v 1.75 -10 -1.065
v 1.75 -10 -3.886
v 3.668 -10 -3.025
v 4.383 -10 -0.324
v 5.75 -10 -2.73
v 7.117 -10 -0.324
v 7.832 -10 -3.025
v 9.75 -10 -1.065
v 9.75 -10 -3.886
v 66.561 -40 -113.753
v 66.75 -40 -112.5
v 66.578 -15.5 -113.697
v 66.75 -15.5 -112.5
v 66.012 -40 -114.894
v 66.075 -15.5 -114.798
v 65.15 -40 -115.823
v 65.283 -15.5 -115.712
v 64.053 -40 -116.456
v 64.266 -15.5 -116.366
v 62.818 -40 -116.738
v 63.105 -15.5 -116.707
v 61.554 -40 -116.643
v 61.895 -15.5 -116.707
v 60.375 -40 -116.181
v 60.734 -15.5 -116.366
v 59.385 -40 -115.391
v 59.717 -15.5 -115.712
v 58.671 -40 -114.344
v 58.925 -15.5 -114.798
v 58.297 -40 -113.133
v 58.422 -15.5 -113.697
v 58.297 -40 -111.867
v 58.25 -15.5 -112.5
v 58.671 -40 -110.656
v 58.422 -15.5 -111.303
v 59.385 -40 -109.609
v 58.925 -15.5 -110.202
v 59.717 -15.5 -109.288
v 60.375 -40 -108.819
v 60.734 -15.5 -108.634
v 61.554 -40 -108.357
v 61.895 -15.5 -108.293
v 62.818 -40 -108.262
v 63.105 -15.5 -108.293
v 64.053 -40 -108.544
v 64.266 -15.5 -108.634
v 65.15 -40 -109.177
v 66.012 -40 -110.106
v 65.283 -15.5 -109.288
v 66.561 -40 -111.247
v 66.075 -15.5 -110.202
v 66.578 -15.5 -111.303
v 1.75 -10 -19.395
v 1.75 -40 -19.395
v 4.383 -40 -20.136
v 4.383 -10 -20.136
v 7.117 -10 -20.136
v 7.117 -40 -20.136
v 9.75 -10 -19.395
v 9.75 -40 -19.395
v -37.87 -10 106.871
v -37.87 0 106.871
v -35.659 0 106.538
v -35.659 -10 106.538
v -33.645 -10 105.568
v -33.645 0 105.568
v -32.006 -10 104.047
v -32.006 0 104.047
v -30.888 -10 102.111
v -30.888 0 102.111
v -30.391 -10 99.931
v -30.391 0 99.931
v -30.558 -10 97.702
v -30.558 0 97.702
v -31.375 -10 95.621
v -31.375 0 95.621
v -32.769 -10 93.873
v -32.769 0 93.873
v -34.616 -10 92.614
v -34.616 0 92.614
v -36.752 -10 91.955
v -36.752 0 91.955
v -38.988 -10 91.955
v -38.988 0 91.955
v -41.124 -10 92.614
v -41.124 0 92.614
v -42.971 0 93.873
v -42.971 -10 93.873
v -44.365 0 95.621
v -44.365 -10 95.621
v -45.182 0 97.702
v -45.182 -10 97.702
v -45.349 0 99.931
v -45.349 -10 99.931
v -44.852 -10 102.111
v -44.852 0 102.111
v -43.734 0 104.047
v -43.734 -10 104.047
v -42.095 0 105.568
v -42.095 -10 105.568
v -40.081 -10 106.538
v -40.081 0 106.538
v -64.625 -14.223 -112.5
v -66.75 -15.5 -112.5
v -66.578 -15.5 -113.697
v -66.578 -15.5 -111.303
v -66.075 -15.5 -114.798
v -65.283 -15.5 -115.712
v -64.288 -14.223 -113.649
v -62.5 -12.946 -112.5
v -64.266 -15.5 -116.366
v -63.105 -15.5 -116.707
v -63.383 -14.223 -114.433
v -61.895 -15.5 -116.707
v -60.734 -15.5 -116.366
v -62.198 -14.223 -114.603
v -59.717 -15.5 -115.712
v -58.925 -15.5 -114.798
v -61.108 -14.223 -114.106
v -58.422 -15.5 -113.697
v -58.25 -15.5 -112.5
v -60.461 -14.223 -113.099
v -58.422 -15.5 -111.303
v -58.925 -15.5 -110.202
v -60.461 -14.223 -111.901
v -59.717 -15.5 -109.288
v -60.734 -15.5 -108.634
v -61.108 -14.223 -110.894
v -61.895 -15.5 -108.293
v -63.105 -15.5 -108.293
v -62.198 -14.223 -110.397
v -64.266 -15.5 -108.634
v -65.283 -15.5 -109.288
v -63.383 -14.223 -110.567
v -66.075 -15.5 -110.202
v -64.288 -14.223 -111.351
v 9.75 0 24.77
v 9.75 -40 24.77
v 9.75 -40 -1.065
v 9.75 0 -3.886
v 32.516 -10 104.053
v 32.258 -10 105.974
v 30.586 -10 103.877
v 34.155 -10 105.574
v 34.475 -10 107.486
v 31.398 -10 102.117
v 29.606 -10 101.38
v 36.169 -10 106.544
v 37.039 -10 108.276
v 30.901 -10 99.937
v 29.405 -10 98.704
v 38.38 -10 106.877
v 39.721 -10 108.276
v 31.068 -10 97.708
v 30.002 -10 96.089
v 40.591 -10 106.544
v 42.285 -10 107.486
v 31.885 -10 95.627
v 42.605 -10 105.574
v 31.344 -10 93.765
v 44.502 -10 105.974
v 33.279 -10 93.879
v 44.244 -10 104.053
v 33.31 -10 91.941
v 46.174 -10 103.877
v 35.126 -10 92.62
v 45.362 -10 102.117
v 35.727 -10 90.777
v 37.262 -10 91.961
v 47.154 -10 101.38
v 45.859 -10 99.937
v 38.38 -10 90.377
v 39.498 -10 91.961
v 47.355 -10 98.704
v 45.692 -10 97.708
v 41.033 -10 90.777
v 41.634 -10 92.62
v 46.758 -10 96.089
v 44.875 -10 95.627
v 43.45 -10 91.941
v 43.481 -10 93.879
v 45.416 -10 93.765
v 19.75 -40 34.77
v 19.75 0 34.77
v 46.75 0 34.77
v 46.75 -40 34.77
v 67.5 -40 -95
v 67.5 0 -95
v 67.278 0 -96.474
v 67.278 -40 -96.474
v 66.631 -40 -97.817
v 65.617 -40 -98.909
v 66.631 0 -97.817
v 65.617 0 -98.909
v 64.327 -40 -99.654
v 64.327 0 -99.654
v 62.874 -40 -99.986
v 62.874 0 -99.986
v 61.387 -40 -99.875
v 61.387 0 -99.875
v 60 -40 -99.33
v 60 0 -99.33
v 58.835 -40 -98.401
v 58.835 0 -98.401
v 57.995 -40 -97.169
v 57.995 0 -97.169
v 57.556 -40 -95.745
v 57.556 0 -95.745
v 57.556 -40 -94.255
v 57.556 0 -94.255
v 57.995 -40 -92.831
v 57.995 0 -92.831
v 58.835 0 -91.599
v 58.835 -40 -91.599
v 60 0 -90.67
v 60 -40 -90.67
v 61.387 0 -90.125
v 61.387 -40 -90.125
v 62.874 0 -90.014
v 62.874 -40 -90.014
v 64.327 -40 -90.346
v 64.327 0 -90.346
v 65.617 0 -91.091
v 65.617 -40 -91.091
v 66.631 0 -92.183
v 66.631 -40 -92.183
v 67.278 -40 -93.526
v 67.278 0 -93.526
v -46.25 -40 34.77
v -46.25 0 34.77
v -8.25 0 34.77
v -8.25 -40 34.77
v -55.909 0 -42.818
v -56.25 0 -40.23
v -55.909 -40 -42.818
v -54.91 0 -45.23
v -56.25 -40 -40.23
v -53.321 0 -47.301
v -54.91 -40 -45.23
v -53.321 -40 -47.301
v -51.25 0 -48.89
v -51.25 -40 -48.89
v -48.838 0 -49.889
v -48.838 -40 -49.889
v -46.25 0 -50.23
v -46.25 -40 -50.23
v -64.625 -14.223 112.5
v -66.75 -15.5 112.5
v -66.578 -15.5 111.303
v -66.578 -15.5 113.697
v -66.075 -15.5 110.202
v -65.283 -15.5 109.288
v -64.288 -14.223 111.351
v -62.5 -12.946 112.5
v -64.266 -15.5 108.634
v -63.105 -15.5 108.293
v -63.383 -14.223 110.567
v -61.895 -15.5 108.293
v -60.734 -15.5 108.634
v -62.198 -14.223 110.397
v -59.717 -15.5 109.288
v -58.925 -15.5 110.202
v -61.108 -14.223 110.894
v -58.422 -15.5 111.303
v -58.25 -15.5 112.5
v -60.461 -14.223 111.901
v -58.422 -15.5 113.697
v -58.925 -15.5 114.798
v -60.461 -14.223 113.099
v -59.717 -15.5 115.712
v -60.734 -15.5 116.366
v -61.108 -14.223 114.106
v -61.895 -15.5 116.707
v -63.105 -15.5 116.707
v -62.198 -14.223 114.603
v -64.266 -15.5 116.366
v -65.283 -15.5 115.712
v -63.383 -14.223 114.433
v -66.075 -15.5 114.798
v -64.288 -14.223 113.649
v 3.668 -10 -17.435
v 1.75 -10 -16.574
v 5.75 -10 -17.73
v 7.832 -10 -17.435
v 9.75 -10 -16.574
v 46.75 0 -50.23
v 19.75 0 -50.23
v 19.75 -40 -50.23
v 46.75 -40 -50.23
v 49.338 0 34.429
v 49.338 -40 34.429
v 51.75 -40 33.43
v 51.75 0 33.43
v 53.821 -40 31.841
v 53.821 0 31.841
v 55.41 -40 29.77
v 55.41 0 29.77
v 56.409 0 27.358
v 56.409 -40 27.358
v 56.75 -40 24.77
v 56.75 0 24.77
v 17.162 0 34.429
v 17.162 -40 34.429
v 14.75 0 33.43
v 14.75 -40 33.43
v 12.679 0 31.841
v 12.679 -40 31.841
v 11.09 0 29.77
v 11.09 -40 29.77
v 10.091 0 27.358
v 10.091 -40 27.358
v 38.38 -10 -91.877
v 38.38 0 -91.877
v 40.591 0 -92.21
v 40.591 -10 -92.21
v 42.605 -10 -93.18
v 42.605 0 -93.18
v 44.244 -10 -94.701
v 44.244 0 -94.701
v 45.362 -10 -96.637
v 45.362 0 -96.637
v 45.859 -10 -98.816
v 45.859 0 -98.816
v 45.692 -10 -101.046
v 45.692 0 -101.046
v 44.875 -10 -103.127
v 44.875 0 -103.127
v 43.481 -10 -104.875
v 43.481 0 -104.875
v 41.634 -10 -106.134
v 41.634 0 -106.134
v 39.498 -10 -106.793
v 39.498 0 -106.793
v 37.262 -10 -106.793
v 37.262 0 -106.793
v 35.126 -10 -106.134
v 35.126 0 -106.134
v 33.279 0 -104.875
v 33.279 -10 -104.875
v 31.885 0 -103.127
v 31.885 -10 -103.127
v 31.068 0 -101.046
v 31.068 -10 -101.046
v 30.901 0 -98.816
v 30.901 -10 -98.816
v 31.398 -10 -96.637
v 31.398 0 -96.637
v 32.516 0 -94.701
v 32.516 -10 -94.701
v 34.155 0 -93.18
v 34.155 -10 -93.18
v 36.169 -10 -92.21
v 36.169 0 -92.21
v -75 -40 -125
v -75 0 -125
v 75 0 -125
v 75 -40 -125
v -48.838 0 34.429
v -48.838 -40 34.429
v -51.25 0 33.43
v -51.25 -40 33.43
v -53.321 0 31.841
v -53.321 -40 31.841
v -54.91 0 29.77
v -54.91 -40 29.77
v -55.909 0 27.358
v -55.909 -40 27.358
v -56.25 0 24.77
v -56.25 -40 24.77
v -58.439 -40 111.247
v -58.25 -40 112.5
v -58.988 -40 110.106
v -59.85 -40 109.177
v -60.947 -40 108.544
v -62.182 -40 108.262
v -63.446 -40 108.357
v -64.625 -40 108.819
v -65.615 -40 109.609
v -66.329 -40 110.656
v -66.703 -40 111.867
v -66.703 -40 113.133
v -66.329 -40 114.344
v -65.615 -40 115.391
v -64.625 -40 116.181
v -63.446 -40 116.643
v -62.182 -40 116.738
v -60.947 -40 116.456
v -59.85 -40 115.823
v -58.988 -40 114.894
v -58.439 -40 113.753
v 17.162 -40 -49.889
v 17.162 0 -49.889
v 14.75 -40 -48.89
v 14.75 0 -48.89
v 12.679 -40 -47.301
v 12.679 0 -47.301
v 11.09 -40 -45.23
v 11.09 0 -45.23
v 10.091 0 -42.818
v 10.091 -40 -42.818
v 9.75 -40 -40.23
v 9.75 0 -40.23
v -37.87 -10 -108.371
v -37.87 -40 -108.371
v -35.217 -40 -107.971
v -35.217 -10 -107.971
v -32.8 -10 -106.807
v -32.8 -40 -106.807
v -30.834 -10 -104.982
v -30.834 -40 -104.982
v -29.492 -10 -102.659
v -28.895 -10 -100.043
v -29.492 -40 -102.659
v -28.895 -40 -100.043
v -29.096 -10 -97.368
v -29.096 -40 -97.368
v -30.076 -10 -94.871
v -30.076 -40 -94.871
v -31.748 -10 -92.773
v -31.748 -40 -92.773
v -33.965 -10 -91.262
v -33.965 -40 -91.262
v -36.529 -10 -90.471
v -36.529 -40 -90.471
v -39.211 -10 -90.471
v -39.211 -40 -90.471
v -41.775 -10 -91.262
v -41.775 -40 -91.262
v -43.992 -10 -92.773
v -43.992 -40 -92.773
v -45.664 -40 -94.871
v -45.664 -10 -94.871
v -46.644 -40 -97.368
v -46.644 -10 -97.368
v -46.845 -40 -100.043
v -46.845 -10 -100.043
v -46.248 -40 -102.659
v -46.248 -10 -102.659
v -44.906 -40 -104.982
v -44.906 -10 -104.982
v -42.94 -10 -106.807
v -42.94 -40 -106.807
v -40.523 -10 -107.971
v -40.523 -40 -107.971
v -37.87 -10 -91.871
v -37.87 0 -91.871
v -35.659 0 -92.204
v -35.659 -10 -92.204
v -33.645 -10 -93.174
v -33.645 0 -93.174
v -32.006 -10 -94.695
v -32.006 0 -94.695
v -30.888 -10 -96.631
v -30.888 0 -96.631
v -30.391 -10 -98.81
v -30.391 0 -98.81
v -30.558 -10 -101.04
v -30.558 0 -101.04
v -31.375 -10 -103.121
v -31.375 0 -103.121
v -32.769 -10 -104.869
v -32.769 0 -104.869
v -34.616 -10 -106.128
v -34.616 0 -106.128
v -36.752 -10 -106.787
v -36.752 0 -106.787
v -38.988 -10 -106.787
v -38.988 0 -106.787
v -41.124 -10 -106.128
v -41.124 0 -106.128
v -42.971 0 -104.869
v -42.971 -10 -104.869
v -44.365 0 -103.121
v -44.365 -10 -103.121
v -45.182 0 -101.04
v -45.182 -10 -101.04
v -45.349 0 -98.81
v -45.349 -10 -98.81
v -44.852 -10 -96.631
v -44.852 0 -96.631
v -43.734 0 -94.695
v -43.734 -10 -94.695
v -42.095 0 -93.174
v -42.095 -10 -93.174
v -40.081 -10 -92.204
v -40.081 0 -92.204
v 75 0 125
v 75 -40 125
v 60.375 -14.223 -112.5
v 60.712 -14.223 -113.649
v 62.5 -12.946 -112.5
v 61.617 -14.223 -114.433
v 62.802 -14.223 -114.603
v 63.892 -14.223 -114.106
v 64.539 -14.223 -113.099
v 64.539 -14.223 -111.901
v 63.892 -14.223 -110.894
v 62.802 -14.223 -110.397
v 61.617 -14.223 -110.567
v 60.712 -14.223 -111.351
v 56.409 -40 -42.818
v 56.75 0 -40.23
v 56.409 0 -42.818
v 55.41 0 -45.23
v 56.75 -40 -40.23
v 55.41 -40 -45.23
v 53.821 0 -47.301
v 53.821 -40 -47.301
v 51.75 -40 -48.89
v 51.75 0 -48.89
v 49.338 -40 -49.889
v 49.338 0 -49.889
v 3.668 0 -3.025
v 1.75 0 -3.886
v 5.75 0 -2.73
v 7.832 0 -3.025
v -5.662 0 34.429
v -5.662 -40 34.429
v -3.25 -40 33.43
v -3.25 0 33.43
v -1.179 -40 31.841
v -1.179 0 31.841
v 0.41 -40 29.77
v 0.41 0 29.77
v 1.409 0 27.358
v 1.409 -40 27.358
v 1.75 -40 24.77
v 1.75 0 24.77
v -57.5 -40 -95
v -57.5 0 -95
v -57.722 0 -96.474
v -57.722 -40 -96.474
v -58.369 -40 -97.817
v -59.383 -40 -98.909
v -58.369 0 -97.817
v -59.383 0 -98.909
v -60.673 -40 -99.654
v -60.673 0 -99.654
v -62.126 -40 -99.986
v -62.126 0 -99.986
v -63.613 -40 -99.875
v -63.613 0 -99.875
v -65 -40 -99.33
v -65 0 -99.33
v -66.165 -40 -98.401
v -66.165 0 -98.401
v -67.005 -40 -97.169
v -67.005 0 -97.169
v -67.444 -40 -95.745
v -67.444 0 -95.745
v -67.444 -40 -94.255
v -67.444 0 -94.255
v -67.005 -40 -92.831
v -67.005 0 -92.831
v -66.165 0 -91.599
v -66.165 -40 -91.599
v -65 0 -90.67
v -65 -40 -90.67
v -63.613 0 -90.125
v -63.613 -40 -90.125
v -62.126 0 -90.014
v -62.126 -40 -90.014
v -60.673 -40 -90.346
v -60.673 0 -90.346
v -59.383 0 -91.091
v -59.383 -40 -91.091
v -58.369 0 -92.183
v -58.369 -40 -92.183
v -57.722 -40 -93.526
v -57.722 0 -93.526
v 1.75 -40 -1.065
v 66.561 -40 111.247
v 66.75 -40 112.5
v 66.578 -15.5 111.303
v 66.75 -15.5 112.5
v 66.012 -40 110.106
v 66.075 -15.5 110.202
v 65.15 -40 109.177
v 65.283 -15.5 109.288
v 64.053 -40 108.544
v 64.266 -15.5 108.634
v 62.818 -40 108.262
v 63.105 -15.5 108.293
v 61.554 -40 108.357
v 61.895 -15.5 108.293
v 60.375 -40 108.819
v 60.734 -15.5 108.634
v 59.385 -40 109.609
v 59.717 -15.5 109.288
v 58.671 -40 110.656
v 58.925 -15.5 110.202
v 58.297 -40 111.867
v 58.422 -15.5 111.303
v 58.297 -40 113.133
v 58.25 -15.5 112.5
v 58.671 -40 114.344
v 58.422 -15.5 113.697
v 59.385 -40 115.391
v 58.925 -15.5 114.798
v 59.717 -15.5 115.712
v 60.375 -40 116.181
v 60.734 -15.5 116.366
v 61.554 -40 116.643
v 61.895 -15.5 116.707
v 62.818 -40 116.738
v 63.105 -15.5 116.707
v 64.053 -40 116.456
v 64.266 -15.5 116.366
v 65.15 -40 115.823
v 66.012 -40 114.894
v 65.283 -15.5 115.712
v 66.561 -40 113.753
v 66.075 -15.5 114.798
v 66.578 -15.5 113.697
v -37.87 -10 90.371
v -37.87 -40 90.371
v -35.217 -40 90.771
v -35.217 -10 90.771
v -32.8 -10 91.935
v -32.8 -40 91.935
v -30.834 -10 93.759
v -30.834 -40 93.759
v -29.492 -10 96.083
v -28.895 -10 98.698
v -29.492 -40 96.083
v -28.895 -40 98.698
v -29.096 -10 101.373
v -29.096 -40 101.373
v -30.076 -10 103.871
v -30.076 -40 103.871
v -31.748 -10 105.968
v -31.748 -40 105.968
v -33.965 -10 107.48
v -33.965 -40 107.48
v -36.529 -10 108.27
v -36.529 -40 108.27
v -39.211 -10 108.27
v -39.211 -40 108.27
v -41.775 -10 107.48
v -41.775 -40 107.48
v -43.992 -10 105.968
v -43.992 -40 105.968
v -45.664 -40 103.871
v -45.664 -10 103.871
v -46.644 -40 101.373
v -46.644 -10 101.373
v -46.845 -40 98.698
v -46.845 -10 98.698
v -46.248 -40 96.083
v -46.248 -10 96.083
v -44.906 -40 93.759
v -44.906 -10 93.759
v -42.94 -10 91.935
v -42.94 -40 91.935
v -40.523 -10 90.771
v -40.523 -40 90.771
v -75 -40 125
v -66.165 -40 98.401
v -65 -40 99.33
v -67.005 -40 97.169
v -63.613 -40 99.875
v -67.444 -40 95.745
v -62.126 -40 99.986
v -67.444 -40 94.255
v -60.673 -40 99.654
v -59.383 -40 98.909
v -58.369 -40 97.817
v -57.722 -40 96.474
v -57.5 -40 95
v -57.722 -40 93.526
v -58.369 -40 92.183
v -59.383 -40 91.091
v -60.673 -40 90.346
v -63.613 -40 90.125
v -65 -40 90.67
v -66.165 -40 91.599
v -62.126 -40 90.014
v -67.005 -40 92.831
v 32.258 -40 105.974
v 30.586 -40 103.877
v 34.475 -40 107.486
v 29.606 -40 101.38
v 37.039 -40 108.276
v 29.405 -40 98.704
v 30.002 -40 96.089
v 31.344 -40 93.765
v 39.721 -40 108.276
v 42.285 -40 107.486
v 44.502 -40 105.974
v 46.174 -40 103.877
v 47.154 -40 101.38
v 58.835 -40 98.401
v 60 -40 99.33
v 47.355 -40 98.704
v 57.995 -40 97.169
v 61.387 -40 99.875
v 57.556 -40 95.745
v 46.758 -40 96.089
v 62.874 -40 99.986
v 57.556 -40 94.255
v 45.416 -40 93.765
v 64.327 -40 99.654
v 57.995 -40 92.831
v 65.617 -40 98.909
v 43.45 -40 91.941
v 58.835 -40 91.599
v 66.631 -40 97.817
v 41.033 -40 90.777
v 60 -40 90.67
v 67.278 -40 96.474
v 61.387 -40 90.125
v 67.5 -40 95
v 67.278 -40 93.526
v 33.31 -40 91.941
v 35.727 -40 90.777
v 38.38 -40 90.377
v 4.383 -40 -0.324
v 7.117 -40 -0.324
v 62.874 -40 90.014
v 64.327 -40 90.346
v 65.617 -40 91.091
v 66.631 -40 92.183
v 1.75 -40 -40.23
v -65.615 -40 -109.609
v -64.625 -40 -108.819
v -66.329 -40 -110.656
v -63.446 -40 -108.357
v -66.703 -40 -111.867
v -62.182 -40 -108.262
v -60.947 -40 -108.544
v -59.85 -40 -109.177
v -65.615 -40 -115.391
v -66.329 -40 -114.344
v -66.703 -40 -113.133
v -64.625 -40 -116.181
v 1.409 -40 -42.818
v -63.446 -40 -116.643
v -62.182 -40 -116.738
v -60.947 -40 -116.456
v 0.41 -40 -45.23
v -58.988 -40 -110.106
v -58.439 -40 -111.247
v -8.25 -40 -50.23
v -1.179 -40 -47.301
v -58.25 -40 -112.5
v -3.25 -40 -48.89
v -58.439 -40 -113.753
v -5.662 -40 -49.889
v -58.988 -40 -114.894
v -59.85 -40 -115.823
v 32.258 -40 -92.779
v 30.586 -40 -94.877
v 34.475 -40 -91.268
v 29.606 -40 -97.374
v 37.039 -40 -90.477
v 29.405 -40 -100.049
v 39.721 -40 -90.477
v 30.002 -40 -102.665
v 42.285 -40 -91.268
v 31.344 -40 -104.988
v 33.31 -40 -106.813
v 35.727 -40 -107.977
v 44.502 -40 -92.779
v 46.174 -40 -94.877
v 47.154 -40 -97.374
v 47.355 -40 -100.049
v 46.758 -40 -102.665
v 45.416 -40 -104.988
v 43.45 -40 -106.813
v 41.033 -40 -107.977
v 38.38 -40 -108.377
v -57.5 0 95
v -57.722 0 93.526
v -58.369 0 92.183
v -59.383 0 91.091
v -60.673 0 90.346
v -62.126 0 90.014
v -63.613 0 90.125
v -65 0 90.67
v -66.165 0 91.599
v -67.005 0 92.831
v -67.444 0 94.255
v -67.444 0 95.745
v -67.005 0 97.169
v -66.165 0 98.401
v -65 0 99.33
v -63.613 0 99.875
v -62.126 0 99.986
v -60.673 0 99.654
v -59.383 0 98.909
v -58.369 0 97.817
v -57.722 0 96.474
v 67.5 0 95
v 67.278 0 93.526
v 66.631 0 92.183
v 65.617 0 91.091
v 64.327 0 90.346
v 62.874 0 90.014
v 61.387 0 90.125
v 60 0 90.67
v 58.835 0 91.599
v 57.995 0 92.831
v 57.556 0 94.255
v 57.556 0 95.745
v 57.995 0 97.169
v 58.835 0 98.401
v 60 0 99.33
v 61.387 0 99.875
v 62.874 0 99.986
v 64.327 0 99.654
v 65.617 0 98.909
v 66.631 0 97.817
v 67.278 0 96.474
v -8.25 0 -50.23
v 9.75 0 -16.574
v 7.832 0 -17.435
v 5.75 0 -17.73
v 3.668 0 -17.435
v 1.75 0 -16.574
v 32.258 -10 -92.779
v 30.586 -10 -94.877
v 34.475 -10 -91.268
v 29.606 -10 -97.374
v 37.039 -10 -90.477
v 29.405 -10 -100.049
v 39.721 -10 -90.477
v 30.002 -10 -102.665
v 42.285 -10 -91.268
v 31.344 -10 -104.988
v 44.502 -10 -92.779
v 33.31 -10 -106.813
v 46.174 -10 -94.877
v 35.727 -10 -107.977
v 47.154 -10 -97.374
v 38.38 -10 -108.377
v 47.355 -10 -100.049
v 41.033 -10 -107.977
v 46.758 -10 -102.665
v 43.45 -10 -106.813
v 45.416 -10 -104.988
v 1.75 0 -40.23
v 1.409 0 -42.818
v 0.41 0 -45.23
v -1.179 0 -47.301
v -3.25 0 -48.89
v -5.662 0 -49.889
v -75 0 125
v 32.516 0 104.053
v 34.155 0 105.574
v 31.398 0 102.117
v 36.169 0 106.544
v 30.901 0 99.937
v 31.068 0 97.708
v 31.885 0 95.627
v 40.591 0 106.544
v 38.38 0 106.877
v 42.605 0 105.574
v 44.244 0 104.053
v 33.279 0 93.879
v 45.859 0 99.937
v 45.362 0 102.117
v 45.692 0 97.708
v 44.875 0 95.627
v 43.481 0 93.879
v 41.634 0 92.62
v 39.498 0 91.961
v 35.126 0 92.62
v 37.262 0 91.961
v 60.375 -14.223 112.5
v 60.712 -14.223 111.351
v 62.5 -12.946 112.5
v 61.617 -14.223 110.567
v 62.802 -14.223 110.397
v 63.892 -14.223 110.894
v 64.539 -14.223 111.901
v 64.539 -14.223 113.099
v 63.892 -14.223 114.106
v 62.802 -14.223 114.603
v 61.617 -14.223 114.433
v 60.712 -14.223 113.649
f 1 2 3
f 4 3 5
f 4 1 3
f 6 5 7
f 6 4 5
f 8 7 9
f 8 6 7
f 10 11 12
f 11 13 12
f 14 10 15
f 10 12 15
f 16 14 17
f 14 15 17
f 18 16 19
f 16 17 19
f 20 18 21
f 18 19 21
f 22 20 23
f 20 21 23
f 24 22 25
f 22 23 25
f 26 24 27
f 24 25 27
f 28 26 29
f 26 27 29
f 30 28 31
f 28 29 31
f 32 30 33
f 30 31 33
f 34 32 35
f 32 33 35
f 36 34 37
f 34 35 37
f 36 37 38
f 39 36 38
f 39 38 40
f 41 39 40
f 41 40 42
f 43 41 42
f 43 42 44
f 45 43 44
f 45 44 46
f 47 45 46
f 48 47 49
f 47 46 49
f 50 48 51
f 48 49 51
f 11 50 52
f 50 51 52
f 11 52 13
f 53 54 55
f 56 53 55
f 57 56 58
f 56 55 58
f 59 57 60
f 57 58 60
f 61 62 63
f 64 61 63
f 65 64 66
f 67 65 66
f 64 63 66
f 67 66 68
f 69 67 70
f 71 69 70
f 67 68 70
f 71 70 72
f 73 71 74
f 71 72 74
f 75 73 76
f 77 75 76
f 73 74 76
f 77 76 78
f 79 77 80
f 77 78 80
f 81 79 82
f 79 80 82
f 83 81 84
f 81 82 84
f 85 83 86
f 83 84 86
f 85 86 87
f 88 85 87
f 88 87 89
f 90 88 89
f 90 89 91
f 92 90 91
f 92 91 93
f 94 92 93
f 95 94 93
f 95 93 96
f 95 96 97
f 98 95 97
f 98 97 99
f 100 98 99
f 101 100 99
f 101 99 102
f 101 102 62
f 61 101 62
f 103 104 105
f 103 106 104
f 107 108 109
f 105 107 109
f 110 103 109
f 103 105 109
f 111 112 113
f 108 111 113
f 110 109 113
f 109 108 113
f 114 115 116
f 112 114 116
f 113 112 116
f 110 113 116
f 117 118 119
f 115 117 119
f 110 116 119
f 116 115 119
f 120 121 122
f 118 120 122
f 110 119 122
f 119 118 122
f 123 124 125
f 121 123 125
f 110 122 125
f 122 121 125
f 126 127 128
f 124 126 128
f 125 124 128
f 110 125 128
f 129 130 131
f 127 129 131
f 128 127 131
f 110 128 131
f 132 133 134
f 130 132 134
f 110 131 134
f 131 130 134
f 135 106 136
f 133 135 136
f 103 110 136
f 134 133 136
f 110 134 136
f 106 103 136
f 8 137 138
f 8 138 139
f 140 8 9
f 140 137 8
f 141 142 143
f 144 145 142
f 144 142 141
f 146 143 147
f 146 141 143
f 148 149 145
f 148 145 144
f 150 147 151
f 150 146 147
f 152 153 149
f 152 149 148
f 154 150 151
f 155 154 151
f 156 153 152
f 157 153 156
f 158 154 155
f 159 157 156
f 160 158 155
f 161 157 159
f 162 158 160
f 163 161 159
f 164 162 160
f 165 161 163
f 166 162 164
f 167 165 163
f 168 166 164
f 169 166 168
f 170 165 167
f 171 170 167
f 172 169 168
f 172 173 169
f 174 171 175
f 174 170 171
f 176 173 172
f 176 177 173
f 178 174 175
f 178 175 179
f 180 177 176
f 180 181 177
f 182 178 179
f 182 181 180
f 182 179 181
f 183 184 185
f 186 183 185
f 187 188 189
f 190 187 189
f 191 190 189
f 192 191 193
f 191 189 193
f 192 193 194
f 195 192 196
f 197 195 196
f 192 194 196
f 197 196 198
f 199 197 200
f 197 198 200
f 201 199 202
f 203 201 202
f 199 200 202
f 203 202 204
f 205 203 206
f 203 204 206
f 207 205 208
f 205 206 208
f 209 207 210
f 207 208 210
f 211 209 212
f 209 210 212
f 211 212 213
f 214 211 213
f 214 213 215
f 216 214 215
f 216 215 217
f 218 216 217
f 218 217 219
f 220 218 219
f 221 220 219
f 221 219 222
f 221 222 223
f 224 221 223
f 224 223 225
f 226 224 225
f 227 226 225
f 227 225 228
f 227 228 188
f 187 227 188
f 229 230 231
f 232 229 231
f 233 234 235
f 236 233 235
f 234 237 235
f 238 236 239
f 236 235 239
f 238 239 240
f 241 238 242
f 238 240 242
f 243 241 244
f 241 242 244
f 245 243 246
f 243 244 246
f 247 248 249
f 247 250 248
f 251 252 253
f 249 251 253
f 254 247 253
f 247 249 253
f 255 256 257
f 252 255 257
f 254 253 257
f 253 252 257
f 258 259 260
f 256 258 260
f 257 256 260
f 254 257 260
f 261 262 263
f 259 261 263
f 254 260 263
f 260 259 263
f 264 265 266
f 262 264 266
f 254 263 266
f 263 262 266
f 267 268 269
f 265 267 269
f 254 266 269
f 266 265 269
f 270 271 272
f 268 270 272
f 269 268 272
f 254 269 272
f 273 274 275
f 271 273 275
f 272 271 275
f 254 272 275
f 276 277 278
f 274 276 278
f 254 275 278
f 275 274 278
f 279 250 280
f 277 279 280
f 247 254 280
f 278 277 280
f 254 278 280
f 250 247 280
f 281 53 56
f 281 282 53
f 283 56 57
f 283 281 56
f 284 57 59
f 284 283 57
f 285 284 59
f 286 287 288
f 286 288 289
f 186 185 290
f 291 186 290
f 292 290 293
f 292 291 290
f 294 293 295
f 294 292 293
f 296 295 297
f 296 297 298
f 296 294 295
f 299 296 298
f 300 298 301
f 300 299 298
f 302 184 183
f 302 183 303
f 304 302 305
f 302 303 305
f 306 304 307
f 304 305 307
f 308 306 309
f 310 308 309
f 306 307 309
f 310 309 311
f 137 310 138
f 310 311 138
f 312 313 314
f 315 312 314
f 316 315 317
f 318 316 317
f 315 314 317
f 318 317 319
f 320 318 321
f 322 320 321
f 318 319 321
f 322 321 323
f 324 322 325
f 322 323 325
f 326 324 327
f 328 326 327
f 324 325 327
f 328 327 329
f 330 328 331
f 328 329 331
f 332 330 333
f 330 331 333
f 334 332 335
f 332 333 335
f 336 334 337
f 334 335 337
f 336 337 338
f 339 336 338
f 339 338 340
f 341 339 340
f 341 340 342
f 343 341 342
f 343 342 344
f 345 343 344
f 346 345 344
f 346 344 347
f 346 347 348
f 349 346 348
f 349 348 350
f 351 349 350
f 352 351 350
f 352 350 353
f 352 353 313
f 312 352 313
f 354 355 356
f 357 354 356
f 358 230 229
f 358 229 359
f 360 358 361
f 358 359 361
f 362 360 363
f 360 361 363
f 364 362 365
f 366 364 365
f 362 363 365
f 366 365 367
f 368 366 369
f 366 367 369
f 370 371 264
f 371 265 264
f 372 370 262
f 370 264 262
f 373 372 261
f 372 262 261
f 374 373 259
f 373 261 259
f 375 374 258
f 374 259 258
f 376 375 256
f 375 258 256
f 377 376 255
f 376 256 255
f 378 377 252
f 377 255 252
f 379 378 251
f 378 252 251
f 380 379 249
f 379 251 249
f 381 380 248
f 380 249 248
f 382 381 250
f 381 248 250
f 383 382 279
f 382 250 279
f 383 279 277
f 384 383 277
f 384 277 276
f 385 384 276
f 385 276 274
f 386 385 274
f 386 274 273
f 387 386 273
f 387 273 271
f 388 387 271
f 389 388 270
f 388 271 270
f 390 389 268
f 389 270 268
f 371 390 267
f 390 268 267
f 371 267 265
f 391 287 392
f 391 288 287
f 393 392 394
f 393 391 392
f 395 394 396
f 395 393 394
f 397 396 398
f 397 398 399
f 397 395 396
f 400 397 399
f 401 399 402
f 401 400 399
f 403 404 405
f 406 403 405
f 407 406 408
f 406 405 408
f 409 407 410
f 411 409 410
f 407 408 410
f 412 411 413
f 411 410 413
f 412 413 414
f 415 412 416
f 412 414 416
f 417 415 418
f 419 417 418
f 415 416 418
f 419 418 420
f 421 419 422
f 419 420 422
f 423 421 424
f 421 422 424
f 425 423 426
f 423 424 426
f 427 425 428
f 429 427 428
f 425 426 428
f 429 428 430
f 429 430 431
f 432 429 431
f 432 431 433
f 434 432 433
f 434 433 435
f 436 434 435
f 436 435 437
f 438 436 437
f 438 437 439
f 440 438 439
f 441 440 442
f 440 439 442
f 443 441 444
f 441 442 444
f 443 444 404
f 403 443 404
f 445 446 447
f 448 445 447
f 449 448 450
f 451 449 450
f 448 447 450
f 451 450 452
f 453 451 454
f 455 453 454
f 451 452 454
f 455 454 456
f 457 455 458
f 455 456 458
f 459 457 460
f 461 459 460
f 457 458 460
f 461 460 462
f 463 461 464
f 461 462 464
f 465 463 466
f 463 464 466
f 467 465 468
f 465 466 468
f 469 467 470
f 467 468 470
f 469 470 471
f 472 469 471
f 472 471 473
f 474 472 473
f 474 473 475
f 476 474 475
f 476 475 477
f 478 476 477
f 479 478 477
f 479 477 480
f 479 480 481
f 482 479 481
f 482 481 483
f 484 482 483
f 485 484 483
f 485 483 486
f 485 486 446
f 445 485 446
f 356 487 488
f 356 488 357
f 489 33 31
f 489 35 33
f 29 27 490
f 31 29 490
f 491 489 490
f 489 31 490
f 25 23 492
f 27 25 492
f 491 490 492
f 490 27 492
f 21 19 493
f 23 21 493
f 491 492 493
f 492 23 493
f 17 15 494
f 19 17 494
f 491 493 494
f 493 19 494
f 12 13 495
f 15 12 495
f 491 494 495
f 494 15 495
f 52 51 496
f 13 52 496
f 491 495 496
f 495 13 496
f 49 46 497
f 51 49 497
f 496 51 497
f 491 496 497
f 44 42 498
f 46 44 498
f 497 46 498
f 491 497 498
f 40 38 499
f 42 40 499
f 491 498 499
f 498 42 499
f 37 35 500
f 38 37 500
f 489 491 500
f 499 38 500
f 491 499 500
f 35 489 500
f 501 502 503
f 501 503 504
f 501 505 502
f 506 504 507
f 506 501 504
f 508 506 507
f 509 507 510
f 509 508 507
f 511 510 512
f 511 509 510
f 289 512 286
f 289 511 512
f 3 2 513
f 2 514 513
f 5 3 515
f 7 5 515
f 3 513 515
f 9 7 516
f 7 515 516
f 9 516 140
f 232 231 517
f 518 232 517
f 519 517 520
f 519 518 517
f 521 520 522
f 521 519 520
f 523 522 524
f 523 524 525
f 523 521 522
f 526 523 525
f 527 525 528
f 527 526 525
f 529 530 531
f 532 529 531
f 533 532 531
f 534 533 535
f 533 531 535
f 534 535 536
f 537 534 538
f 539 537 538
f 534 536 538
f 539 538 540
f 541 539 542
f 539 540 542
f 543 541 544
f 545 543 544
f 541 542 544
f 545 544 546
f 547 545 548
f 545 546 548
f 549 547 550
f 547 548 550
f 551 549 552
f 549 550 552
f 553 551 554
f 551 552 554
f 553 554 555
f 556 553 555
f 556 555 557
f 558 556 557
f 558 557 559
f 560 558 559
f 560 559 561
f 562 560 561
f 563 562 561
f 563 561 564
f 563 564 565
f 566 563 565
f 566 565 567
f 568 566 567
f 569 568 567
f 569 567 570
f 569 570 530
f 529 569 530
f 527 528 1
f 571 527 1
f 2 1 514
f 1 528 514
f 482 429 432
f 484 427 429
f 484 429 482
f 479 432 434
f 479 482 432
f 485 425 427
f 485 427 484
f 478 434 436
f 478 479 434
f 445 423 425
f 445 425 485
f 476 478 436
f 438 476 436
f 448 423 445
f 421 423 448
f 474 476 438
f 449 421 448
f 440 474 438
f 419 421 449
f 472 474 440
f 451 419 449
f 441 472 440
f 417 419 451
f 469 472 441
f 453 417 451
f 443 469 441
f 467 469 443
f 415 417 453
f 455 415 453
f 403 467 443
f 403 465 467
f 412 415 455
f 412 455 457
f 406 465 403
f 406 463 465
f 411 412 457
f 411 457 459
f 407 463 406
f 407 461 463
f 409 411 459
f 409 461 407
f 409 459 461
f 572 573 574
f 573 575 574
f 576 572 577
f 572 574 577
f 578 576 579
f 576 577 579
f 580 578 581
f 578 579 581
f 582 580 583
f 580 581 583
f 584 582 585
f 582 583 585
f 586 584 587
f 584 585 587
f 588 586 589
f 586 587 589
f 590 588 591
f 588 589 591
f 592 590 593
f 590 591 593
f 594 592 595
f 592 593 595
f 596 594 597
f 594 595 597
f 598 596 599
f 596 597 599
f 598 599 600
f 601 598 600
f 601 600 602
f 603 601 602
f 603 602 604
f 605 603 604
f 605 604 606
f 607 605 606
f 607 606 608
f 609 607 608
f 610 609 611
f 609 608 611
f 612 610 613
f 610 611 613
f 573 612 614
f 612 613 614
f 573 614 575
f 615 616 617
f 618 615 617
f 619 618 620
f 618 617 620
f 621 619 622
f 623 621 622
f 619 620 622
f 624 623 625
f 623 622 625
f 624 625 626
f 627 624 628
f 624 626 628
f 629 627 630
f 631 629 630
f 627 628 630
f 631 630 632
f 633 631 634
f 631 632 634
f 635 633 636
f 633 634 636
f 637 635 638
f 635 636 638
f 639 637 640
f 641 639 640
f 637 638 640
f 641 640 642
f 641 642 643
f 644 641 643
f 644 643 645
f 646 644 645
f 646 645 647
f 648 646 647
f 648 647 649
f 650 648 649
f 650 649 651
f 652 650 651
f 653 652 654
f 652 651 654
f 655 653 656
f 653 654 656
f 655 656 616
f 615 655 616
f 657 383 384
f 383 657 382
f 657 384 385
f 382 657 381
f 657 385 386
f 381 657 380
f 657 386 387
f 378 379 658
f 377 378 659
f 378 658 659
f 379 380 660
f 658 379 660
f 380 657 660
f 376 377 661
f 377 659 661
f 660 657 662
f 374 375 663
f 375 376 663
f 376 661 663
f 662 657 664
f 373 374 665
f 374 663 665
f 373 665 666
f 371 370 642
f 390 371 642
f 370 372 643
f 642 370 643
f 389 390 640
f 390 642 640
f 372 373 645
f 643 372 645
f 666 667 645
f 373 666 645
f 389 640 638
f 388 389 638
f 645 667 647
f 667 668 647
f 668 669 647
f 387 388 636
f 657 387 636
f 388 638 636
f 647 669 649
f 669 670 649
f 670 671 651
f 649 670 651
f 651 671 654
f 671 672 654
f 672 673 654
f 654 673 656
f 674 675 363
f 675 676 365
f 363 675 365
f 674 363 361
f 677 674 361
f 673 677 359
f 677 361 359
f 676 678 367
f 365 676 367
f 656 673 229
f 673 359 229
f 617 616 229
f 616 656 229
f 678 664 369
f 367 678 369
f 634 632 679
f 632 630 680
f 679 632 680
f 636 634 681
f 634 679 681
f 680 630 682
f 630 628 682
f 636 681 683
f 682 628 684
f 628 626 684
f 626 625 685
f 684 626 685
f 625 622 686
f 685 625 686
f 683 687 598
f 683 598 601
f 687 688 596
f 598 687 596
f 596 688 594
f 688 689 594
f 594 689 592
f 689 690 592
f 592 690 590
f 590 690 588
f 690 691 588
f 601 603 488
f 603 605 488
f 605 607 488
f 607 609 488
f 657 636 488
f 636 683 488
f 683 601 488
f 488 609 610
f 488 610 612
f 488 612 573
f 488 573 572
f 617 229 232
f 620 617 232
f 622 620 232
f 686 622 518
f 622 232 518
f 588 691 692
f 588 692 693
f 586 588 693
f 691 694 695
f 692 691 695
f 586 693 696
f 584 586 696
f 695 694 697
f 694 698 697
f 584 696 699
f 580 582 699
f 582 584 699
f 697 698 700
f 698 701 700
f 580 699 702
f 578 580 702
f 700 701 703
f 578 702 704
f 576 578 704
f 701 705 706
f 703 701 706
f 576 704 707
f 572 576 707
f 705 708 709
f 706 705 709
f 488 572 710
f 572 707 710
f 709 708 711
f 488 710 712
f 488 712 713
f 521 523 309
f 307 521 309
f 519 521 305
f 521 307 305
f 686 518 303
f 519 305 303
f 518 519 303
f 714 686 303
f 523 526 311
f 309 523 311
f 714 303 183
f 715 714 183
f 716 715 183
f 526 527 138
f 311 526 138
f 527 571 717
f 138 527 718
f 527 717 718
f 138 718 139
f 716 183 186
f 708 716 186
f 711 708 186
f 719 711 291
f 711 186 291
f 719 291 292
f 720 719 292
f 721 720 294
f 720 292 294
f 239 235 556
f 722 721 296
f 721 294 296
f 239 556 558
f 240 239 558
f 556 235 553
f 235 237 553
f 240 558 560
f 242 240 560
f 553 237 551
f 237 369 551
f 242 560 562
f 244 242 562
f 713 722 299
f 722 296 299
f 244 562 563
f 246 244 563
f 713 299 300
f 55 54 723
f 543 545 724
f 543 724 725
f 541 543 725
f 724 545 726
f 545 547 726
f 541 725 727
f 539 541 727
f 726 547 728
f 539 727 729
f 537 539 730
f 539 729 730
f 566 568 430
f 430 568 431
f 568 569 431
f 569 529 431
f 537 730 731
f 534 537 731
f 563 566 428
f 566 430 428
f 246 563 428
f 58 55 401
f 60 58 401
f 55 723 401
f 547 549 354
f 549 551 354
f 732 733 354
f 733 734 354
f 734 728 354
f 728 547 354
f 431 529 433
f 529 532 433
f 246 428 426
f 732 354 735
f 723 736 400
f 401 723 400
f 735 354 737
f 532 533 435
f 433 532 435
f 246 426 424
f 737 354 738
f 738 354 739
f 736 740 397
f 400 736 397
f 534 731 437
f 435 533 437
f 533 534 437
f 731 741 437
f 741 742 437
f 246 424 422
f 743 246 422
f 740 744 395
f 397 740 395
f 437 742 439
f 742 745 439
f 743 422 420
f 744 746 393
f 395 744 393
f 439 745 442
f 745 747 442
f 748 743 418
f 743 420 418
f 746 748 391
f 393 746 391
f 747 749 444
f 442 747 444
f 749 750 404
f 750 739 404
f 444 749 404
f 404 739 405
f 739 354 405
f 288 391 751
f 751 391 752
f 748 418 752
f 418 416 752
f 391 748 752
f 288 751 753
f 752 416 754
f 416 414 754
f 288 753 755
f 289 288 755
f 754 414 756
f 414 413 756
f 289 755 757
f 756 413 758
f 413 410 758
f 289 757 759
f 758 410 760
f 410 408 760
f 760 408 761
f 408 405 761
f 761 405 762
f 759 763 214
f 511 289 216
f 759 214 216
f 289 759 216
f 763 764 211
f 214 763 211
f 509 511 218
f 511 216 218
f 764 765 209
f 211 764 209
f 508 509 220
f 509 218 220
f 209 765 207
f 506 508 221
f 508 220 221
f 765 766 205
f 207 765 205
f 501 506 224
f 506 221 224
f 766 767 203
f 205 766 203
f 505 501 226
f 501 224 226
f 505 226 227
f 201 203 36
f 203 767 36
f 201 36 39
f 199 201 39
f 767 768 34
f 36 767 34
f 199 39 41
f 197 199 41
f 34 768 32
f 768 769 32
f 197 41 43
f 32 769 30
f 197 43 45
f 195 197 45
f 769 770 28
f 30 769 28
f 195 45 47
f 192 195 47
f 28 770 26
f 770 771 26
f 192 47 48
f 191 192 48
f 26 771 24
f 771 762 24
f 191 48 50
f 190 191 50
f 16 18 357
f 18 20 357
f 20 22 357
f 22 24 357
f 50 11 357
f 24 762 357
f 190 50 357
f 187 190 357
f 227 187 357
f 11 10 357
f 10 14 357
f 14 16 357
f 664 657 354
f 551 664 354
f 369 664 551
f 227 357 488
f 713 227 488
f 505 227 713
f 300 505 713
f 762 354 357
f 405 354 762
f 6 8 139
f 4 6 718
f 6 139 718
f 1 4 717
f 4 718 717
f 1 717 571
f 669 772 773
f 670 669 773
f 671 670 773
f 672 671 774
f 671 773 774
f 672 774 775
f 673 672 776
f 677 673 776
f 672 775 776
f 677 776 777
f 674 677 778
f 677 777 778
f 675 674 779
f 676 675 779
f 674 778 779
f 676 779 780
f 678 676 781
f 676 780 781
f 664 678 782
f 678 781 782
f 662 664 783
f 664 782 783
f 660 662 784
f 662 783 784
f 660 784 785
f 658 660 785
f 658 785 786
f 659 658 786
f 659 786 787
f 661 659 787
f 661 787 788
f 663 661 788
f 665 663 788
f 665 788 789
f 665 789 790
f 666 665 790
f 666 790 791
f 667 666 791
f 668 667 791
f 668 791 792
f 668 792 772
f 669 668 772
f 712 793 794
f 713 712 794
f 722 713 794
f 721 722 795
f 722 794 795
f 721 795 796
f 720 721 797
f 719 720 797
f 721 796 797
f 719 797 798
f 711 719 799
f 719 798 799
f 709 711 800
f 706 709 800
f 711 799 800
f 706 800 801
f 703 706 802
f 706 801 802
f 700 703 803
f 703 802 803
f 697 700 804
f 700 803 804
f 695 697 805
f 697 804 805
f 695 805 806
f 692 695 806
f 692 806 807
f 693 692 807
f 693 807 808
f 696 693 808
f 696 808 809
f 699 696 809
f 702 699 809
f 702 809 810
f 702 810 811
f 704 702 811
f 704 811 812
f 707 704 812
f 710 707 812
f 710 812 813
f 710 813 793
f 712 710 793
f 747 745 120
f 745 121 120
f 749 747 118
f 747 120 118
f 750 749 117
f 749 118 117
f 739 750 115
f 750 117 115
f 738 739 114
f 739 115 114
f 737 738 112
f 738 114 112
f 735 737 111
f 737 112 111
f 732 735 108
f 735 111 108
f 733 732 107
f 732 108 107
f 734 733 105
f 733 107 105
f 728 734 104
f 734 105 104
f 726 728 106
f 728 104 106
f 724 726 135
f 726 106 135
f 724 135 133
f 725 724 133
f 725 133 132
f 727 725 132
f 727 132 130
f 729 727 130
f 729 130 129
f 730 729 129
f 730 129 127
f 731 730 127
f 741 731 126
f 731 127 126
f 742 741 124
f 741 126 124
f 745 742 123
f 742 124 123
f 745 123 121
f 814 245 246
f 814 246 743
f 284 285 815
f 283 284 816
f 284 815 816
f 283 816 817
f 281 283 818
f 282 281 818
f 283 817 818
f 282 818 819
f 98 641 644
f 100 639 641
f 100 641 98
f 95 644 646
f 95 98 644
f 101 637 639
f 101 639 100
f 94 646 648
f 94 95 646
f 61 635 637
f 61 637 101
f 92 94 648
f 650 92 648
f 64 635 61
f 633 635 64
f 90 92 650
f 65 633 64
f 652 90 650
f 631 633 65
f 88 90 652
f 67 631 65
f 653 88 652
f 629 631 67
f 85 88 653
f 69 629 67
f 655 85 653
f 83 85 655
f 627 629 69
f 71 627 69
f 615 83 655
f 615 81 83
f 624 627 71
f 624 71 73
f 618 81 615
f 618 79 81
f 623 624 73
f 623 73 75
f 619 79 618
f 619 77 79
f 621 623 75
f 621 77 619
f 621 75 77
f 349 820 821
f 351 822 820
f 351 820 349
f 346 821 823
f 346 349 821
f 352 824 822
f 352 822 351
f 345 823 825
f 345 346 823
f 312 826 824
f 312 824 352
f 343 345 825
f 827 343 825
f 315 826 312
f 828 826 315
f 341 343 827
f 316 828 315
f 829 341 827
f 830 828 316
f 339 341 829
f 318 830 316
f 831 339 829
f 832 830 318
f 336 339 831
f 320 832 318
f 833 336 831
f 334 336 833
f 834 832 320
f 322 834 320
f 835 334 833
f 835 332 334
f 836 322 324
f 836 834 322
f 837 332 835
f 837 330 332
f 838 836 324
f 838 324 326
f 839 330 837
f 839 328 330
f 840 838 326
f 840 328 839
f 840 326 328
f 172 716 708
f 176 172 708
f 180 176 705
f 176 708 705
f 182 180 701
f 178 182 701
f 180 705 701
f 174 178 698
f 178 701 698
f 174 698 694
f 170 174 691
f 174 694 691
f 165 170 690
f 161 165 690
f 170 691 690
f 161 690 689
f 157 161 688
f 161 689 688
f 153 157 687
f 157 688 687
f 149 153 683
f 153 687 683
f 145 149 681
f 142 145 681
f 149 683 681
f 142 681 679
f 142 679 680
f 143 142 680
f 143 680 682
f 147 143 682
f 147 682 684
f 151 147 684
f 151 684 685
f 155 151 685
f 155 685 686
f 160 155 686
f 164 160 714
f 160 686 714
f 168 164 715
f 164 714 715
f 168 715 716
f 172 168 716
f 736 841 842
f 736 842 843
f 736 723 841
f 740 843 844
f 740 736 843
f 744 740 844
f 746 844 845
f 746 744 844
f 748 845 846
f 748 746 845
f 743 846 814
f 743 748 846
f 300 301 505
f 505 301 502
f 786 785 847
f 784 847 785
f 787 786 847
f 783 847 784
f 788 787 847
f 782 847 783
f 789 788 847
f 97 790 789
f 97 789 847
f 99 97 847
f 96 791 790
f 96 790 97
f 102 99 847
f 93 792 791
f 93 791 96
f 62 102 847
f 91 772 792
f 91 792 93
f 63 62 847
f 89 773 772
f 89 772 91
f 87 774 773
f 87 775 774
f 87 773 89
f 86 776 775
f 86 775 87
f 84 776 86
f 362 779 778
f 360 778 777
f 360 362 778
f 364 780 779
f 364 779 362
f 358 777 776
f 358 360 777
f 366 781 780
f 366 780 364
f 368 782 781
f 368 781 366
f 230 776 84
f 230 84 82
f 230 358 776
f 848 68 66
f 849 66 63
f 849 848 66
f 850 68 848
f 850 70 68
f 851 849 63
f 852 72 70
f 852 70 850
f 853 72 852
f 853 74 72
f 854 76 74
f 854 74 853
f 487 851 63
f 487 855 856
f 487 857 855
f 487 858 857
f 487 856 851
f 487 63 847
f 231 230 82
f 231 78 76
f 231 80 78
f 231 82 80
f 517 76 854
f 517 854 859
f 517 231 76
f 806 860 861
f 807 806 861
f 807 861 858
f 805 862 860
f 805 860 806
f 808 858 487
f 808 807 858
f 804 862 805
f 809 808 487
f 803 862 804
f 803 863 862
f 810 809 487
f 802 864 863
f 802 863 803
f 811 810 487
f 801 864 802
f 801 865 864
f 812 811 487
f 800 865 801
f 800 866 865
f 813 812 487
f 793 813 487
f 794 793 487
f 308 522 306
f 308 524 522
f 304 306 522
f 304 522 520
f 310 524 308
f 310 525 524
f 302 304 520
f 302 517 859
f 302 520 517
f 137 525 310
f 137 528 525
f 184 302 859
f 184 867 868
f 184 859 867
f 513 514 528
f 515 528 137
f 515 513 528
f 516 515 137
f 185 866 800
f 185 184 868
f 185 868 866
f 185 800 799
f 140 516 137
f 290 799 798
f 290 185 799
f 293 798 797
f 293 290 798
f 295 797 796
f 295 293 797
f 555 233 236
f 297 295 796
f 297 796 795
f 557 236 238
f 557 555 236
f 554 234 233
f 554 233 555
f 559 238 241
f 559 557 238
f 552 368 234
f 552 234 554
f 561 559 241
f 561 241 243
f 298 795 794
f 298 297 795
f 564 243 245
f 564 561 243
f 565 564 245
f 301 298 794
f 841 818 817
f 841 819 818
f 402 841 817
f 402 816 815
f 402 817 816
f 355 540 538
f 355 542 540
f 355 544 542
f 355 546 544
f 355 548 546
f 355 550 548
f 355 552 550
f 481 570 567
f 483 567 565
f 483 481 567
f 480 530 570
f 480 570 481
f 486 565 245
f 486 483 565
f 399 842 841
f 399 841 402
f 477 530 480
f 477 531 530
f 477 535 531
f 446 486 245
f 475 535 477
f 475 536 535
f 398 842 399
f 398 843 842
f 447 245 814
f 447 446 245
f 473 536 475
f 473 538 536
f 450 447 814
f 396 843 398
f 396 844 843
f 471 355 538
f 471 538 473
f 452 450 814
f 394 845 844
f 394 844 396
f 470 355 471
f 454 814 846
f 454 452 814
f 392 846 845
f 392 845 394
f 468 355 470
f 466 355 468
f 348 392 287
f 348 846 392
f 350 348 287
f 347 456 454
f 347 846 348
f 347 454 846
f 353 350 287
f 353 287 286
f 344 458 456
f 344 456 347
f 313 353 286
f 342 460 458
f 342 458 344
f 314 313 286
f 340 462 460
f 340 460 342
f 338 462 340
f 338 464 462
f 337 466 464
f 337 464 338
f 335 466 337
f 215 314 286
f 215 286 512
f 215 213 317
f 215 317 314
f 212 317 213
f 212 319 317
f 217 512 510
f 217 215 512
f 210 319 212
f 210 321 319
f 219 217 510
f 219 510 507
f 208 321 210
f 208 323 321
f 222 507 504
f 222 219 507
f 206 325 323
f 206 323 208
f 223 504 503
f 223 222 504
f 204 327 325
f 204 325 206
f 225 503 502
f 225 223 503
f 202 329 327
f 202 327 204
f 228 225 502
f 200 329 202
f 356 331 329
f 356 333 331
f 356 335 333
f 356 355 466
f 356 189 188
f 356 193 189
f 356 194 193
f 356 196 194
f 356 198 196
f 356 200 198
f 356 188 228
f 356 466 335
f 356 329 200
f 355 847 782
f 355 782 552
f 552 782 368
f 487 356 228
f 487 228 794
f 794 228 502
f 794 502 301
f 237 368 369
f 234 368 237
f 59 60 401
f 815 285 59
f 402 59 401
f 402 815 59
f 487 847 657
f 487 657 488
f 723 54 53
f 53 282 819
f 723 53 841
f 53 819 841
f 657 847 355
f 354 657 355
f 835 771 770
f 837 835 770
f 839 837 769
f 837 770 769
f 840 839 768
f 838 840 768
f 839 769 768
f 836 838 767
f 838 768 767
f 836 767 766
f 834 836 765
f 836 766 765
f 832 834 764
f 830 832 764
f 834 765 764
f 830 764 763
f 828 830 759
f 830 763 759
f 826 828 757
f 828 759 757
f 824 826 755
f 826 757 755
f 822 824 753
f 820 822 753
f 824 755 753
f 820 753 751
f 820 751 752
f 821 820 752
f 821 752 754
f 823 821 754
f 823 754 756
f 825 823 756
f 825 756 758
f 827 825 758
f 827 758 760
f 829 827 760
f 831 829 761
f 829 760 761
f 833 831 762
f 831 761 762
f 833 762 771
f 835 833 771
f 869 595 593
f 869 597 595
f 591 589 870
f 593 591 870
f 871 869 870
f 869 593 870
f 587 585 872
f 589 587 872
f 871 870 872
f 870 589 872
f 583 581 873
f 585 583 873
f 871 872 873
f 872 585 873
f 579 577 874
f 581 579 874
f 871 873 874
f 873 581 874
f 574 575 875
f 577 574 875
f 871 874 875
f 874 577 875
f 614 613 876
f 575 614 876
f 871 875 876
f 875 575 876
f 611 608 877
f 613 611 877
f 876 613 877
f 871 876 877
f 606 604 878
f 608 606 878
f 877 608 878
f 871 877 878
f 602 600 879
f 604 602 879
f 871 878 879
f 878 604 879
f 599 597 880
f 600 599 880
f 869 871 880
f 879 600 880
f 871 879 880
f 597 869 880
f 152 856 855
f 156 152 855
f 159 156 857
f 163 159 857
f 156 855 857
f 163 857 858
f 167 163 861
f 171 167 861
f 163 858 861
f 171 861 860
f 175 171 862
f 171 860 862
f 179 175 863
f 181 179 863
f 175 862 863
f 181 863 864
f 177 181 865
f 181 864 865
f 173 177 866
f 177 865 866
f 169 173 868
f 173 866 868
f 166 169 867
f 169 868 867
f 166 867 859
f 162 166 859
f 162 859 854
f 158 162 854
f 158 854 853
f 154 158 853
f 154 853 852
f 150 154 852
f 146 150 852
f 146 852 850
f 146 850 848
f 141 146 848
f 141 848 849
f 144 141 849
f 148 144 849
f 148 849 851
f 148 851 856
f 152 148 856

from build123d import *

# Parameters (mm, degrees)
SKETCH1_W              = 150
SKETCH1_H              = 250
BOSS_EXTRUDE1_DEPTH    = 40
CUT_EXTRUDE1_REACH     = 153.162
SKETCH3_W              = 58
SKETCH3_H              = 85
SKETCH3_W_2            = 47
FILLET1_R              = 10
SKETCH7_R              = 7.5
CUT_EXTRUDE4_DEPTH     = 369.774778015
SKETCH8_R              = 10
CUT_EXTRUDE5_DEPTH     = 30
M10_TAPPED_HOLE1_D     = 8.5
M10_TAPPED_HOLE1_DEPTH = 24.5
M10_TAPPED_HOLE1_TIP   = 2.553657631
F_10_0MM_DOWEL_HOLE1_D = 10
CUT_EXTRUDE6_REACH     = 153.162
SKETCH15_R             = 7.5
SKETCH16_R             = 9
CUT_EXTRUDE7_DEPTH     = 30


with BuildPart() as part:
    # Sketch1 → Boss-Extrude1 (new body)
    with BuildSketch(Plane(origin=(0, 0, 0), x_dir=(1, 0, 0), z_dir=(0, 1, 0))):
        Rectangle(SKETCH1_W, SKETCH1_H)
    extrude(amount=-BOSS_EXTRUDE1_DEPTH)

    # Sketch3 → Cut-Extrude1 (cut, up to next)
    with BuildSketch(Plane(origin=(0, 0, 0), x_dir=(1, 0, 0), z_dir=(0, 1, 0)), mode=Mode.PRIVATE) as cut_extrude1_sk1:
        with Locations((-27.25, 7.73)):
            Rectangle(SKETCH3_W, SKETCH3_H)
    cut_extrude1_tool1 = extrude(cut_extrude1_sk1.sketch, amount=-CUT_EXTRUDE1_REACH, mode=Mode.PRIVATE) & part.part
    # Sketch3 → Cut-Extrude1 (cut, up to next)
    with BuildSketch(Plane(origin=(0, 0, 0), x_dir=(1, 0, 0), z_dir=(0, 1, 0)), mode=Mode.PRIVATE) as cut_extrude1_sk2:
        with Locations((33.25, 7.73)):
            Rectangle(SKETCH3_W_2, SKETCH3_H)
    cut_extrude1_tool2 = extrude(cut_extrude1_sk2.sketch, amount=-CUT_EXTRUDE1_REACH, mode=Mode.PRIVATE) & part.part
    add(cut_extrude1_tool1.solids().sort_by_distance((-27.25, 0, -7.73))[0], mode=Mode.SUBTRACT)
    add(cut_extrude1_tool2.solids().sort_by_distance((33.25, 0, -7.73))[0], mode=Mode.SUBTRACT)

    # Fillet1
    fillet1_edges = [part.edges().sort_by_distance(p)[0] for p in [
        (-56.25, -20, 34.77),
        (-56.25, -20, -50.23),
        (1.75, -20, -50.23),
        (1.75, -20, 34.77),
        (9.75, -20, 34.77),
        (9.75, -20, -50.23),
        (56.75, -20, -50.23),
        (56.75, -20, 34.77),
    ]]
    fillet(fillet1_edges, radius=FILLET1_R)

    # Sketch7 → Cut-Extrude4 (cut, through all)
    with BuildSketch(Plane(origin=(269.63, 0, 0), x_dir=(1, 0, 0), z_dir=(0, 1, 0))):
        with Locations((-263.88, 10.23)):
            Circle(SKETCH7_R)
    extrude(amount=-CUT_EXTRUDE4_DEPTH, mode=Mode.SUBTRACT)

    # Sketch8 → Cut-Extrude5 (cut)
    with BuildSketch(Plane(origin=(269.63, -40, 0), x_dir=(1, 0, 0), z_dir=(0, -1, 0))):
        with Locations((-263.88, -10.23)):
            Circle(SKETCH8_R)
    extrude(amount=-CUT_EXTRUDE5_DEPTH, mode=Mode.SUBTRACT)

    # M10 Tapped Hole1
    with Locations(Plane(origin=(0, -40, 0), x_dir=(-1, 0, 0), z_dir=(0, -1, 0))):
        with Locations((-62.5, 112.5), (62.5, 112.5), (62.5, -112.5), (-62.5, -112.5)):
            Hole(M10_TAPPED_HOLE1_D / 2, depth=M10_TAPPED_HOLE1_DEPTH)
            with Locations((0, 0, -(M10_TAPPED_HOLE1_DEPTH + M10_TAPPED_HOLE1_TIP / 2))):  # 118° drill point
                Cone(0, M10_TAPPED_HOLE1_D / 2, M10_TAPPED_HOLE1_TIP, mode=Mode.SUBTRACT)

    # Ø10.0mm Dowel Hole1 (through all)
    with Locations(Plane(origin=(0, -40, 0), x_dir=(-1, 0, 0), z_dir=(0, -1, 0))):
        with Locations((-62.5, 95), (-62.5, -95), (62.5, -95), (62.5, 95)):
            Hole(F_10_0MM_DOWEL_HOLE1_D / 2)

    # Sketch15 → Cut-Extrude6 (cut, up to next)
    with BuildSketch(Plane(origin=(0, 0, 0), x_dir=(1, 0, 0), z_dir=(0, 1, 0)), mode=Mode.PRIVATE) as cut_extrude6_sk1:
        with Locations(Location((38.38, -99.376818869, 0), (0, 0, 270))):
            Circle(SKETCH15_R)
    cut_extrude6_tool1 = extrude(cut_extrude6_sk1.sketch, amount=-CUT_EXTRUDE6_REACH, mode=Mode.PRIVATE) & part.part
    # Sketch15 → Cut-Extrude6 (cut, up to next)
    with BuildSketch(Plane(origin=(0, 0, 0), x_dir=(1, 0, 0), z_dir=(0, 1, 0)), mode=Mode.PRIVATE) as cut_extrude6_sk2:
        with Locations(Location((-37.87, -99.370796223, 0), (0, 0, 270))):
            Circle(SKETCH15_R)
    cut_extrude6_tool2 = extrude(cut_extrude6_sk2.sketch, amount=-CUT_EXTRUDE6_REACH, mode=Mode.PRIVATE) & part.part
    # Sketch15 → Cut-Extrude6 (cut, up to next)
    with BuildSketch(Plane(origin=(0, 0, 0), x_dir=(1, 0, 0), z_dir=(0, 1, 0)), mode=Mode.PRIVATE) as cut_extrude6_sk3:
        with Locations(Location((38.38, 99.376818869, 0), (0, 0, 270))):
            Circle(SKETCH15_R)
    cut_extrude6_tool3 = extrude(cut_extrude6_sk3.sketch, amount=-CUT_EXTRUDE6_REACH, mode=Mode.PRIVATE) & part.part
    # Sketch15 → Cut-Extrude6 (cut, up to next)
    with BuildSketch(Plane(origin=(0, 0, 0), x_dir=(1, 0, 0), z_dir=(0, 1, 0)), mode=Mode.PRIVATE) as cut_extrude6_sk4:
        with Locations(Location((-37.87, 99.370796223, 0), (0, 0, 270))):
            Circle(SKETCH15_R)
    cut_extrude6_tool4 = extrude(cut_extrude6_sk4.sketch, amount=-CUT_EXTRUDE6_REACH, mode=Mode.PRIVATE) & part.part
    add(cut_extrude6_tool1.solids().sort_by_distance((38.38, 0, 99.376819))[0], mode=Mode.SUBTRACT)
    add(cut_extrude6_tool2.solids().sort_by_distance((-37.87, 0, 99.370796))[0], mode=Mode.SUBTRACT)
    add(cut_extrude6_tool3.solids().sort_by_distance((38.38, 0, -99.376819))[0], mode=Mode.SUBTRACT)
    add(cut_extrude6_tool4.solids().sort_by_distance((-37.87, 0, -99.370796))[0], mode=Mode.SUBTRACT)

    # Sketch16 → Cut-Extrude7 (cut)
    with BuildSketch(Plane.XZ.offset(40)):
        with Locations(Location((-37.87, -99.370796223, 0), (0, 0, 270))):
            Circle(SKETCH16_R)
        with Locations(Location((38.38, -99.376818869, 0), (0, 0, 270))):
            Circle(SKETCH16_R)
        with Locations(Location((38.38, 99.376818869, 0), (0, 0, 270))):
            Circle(SKETCH16_R)
        with Locations(Location((-37.87, 99.370796223, 0), (0, 0, 270))):
            Circle(SKETCH16_R)
    extrude(amount=-CUT_EXTRUDE7_DEPTH, mode=Mode.SUBTRACT)


solid = part.part
